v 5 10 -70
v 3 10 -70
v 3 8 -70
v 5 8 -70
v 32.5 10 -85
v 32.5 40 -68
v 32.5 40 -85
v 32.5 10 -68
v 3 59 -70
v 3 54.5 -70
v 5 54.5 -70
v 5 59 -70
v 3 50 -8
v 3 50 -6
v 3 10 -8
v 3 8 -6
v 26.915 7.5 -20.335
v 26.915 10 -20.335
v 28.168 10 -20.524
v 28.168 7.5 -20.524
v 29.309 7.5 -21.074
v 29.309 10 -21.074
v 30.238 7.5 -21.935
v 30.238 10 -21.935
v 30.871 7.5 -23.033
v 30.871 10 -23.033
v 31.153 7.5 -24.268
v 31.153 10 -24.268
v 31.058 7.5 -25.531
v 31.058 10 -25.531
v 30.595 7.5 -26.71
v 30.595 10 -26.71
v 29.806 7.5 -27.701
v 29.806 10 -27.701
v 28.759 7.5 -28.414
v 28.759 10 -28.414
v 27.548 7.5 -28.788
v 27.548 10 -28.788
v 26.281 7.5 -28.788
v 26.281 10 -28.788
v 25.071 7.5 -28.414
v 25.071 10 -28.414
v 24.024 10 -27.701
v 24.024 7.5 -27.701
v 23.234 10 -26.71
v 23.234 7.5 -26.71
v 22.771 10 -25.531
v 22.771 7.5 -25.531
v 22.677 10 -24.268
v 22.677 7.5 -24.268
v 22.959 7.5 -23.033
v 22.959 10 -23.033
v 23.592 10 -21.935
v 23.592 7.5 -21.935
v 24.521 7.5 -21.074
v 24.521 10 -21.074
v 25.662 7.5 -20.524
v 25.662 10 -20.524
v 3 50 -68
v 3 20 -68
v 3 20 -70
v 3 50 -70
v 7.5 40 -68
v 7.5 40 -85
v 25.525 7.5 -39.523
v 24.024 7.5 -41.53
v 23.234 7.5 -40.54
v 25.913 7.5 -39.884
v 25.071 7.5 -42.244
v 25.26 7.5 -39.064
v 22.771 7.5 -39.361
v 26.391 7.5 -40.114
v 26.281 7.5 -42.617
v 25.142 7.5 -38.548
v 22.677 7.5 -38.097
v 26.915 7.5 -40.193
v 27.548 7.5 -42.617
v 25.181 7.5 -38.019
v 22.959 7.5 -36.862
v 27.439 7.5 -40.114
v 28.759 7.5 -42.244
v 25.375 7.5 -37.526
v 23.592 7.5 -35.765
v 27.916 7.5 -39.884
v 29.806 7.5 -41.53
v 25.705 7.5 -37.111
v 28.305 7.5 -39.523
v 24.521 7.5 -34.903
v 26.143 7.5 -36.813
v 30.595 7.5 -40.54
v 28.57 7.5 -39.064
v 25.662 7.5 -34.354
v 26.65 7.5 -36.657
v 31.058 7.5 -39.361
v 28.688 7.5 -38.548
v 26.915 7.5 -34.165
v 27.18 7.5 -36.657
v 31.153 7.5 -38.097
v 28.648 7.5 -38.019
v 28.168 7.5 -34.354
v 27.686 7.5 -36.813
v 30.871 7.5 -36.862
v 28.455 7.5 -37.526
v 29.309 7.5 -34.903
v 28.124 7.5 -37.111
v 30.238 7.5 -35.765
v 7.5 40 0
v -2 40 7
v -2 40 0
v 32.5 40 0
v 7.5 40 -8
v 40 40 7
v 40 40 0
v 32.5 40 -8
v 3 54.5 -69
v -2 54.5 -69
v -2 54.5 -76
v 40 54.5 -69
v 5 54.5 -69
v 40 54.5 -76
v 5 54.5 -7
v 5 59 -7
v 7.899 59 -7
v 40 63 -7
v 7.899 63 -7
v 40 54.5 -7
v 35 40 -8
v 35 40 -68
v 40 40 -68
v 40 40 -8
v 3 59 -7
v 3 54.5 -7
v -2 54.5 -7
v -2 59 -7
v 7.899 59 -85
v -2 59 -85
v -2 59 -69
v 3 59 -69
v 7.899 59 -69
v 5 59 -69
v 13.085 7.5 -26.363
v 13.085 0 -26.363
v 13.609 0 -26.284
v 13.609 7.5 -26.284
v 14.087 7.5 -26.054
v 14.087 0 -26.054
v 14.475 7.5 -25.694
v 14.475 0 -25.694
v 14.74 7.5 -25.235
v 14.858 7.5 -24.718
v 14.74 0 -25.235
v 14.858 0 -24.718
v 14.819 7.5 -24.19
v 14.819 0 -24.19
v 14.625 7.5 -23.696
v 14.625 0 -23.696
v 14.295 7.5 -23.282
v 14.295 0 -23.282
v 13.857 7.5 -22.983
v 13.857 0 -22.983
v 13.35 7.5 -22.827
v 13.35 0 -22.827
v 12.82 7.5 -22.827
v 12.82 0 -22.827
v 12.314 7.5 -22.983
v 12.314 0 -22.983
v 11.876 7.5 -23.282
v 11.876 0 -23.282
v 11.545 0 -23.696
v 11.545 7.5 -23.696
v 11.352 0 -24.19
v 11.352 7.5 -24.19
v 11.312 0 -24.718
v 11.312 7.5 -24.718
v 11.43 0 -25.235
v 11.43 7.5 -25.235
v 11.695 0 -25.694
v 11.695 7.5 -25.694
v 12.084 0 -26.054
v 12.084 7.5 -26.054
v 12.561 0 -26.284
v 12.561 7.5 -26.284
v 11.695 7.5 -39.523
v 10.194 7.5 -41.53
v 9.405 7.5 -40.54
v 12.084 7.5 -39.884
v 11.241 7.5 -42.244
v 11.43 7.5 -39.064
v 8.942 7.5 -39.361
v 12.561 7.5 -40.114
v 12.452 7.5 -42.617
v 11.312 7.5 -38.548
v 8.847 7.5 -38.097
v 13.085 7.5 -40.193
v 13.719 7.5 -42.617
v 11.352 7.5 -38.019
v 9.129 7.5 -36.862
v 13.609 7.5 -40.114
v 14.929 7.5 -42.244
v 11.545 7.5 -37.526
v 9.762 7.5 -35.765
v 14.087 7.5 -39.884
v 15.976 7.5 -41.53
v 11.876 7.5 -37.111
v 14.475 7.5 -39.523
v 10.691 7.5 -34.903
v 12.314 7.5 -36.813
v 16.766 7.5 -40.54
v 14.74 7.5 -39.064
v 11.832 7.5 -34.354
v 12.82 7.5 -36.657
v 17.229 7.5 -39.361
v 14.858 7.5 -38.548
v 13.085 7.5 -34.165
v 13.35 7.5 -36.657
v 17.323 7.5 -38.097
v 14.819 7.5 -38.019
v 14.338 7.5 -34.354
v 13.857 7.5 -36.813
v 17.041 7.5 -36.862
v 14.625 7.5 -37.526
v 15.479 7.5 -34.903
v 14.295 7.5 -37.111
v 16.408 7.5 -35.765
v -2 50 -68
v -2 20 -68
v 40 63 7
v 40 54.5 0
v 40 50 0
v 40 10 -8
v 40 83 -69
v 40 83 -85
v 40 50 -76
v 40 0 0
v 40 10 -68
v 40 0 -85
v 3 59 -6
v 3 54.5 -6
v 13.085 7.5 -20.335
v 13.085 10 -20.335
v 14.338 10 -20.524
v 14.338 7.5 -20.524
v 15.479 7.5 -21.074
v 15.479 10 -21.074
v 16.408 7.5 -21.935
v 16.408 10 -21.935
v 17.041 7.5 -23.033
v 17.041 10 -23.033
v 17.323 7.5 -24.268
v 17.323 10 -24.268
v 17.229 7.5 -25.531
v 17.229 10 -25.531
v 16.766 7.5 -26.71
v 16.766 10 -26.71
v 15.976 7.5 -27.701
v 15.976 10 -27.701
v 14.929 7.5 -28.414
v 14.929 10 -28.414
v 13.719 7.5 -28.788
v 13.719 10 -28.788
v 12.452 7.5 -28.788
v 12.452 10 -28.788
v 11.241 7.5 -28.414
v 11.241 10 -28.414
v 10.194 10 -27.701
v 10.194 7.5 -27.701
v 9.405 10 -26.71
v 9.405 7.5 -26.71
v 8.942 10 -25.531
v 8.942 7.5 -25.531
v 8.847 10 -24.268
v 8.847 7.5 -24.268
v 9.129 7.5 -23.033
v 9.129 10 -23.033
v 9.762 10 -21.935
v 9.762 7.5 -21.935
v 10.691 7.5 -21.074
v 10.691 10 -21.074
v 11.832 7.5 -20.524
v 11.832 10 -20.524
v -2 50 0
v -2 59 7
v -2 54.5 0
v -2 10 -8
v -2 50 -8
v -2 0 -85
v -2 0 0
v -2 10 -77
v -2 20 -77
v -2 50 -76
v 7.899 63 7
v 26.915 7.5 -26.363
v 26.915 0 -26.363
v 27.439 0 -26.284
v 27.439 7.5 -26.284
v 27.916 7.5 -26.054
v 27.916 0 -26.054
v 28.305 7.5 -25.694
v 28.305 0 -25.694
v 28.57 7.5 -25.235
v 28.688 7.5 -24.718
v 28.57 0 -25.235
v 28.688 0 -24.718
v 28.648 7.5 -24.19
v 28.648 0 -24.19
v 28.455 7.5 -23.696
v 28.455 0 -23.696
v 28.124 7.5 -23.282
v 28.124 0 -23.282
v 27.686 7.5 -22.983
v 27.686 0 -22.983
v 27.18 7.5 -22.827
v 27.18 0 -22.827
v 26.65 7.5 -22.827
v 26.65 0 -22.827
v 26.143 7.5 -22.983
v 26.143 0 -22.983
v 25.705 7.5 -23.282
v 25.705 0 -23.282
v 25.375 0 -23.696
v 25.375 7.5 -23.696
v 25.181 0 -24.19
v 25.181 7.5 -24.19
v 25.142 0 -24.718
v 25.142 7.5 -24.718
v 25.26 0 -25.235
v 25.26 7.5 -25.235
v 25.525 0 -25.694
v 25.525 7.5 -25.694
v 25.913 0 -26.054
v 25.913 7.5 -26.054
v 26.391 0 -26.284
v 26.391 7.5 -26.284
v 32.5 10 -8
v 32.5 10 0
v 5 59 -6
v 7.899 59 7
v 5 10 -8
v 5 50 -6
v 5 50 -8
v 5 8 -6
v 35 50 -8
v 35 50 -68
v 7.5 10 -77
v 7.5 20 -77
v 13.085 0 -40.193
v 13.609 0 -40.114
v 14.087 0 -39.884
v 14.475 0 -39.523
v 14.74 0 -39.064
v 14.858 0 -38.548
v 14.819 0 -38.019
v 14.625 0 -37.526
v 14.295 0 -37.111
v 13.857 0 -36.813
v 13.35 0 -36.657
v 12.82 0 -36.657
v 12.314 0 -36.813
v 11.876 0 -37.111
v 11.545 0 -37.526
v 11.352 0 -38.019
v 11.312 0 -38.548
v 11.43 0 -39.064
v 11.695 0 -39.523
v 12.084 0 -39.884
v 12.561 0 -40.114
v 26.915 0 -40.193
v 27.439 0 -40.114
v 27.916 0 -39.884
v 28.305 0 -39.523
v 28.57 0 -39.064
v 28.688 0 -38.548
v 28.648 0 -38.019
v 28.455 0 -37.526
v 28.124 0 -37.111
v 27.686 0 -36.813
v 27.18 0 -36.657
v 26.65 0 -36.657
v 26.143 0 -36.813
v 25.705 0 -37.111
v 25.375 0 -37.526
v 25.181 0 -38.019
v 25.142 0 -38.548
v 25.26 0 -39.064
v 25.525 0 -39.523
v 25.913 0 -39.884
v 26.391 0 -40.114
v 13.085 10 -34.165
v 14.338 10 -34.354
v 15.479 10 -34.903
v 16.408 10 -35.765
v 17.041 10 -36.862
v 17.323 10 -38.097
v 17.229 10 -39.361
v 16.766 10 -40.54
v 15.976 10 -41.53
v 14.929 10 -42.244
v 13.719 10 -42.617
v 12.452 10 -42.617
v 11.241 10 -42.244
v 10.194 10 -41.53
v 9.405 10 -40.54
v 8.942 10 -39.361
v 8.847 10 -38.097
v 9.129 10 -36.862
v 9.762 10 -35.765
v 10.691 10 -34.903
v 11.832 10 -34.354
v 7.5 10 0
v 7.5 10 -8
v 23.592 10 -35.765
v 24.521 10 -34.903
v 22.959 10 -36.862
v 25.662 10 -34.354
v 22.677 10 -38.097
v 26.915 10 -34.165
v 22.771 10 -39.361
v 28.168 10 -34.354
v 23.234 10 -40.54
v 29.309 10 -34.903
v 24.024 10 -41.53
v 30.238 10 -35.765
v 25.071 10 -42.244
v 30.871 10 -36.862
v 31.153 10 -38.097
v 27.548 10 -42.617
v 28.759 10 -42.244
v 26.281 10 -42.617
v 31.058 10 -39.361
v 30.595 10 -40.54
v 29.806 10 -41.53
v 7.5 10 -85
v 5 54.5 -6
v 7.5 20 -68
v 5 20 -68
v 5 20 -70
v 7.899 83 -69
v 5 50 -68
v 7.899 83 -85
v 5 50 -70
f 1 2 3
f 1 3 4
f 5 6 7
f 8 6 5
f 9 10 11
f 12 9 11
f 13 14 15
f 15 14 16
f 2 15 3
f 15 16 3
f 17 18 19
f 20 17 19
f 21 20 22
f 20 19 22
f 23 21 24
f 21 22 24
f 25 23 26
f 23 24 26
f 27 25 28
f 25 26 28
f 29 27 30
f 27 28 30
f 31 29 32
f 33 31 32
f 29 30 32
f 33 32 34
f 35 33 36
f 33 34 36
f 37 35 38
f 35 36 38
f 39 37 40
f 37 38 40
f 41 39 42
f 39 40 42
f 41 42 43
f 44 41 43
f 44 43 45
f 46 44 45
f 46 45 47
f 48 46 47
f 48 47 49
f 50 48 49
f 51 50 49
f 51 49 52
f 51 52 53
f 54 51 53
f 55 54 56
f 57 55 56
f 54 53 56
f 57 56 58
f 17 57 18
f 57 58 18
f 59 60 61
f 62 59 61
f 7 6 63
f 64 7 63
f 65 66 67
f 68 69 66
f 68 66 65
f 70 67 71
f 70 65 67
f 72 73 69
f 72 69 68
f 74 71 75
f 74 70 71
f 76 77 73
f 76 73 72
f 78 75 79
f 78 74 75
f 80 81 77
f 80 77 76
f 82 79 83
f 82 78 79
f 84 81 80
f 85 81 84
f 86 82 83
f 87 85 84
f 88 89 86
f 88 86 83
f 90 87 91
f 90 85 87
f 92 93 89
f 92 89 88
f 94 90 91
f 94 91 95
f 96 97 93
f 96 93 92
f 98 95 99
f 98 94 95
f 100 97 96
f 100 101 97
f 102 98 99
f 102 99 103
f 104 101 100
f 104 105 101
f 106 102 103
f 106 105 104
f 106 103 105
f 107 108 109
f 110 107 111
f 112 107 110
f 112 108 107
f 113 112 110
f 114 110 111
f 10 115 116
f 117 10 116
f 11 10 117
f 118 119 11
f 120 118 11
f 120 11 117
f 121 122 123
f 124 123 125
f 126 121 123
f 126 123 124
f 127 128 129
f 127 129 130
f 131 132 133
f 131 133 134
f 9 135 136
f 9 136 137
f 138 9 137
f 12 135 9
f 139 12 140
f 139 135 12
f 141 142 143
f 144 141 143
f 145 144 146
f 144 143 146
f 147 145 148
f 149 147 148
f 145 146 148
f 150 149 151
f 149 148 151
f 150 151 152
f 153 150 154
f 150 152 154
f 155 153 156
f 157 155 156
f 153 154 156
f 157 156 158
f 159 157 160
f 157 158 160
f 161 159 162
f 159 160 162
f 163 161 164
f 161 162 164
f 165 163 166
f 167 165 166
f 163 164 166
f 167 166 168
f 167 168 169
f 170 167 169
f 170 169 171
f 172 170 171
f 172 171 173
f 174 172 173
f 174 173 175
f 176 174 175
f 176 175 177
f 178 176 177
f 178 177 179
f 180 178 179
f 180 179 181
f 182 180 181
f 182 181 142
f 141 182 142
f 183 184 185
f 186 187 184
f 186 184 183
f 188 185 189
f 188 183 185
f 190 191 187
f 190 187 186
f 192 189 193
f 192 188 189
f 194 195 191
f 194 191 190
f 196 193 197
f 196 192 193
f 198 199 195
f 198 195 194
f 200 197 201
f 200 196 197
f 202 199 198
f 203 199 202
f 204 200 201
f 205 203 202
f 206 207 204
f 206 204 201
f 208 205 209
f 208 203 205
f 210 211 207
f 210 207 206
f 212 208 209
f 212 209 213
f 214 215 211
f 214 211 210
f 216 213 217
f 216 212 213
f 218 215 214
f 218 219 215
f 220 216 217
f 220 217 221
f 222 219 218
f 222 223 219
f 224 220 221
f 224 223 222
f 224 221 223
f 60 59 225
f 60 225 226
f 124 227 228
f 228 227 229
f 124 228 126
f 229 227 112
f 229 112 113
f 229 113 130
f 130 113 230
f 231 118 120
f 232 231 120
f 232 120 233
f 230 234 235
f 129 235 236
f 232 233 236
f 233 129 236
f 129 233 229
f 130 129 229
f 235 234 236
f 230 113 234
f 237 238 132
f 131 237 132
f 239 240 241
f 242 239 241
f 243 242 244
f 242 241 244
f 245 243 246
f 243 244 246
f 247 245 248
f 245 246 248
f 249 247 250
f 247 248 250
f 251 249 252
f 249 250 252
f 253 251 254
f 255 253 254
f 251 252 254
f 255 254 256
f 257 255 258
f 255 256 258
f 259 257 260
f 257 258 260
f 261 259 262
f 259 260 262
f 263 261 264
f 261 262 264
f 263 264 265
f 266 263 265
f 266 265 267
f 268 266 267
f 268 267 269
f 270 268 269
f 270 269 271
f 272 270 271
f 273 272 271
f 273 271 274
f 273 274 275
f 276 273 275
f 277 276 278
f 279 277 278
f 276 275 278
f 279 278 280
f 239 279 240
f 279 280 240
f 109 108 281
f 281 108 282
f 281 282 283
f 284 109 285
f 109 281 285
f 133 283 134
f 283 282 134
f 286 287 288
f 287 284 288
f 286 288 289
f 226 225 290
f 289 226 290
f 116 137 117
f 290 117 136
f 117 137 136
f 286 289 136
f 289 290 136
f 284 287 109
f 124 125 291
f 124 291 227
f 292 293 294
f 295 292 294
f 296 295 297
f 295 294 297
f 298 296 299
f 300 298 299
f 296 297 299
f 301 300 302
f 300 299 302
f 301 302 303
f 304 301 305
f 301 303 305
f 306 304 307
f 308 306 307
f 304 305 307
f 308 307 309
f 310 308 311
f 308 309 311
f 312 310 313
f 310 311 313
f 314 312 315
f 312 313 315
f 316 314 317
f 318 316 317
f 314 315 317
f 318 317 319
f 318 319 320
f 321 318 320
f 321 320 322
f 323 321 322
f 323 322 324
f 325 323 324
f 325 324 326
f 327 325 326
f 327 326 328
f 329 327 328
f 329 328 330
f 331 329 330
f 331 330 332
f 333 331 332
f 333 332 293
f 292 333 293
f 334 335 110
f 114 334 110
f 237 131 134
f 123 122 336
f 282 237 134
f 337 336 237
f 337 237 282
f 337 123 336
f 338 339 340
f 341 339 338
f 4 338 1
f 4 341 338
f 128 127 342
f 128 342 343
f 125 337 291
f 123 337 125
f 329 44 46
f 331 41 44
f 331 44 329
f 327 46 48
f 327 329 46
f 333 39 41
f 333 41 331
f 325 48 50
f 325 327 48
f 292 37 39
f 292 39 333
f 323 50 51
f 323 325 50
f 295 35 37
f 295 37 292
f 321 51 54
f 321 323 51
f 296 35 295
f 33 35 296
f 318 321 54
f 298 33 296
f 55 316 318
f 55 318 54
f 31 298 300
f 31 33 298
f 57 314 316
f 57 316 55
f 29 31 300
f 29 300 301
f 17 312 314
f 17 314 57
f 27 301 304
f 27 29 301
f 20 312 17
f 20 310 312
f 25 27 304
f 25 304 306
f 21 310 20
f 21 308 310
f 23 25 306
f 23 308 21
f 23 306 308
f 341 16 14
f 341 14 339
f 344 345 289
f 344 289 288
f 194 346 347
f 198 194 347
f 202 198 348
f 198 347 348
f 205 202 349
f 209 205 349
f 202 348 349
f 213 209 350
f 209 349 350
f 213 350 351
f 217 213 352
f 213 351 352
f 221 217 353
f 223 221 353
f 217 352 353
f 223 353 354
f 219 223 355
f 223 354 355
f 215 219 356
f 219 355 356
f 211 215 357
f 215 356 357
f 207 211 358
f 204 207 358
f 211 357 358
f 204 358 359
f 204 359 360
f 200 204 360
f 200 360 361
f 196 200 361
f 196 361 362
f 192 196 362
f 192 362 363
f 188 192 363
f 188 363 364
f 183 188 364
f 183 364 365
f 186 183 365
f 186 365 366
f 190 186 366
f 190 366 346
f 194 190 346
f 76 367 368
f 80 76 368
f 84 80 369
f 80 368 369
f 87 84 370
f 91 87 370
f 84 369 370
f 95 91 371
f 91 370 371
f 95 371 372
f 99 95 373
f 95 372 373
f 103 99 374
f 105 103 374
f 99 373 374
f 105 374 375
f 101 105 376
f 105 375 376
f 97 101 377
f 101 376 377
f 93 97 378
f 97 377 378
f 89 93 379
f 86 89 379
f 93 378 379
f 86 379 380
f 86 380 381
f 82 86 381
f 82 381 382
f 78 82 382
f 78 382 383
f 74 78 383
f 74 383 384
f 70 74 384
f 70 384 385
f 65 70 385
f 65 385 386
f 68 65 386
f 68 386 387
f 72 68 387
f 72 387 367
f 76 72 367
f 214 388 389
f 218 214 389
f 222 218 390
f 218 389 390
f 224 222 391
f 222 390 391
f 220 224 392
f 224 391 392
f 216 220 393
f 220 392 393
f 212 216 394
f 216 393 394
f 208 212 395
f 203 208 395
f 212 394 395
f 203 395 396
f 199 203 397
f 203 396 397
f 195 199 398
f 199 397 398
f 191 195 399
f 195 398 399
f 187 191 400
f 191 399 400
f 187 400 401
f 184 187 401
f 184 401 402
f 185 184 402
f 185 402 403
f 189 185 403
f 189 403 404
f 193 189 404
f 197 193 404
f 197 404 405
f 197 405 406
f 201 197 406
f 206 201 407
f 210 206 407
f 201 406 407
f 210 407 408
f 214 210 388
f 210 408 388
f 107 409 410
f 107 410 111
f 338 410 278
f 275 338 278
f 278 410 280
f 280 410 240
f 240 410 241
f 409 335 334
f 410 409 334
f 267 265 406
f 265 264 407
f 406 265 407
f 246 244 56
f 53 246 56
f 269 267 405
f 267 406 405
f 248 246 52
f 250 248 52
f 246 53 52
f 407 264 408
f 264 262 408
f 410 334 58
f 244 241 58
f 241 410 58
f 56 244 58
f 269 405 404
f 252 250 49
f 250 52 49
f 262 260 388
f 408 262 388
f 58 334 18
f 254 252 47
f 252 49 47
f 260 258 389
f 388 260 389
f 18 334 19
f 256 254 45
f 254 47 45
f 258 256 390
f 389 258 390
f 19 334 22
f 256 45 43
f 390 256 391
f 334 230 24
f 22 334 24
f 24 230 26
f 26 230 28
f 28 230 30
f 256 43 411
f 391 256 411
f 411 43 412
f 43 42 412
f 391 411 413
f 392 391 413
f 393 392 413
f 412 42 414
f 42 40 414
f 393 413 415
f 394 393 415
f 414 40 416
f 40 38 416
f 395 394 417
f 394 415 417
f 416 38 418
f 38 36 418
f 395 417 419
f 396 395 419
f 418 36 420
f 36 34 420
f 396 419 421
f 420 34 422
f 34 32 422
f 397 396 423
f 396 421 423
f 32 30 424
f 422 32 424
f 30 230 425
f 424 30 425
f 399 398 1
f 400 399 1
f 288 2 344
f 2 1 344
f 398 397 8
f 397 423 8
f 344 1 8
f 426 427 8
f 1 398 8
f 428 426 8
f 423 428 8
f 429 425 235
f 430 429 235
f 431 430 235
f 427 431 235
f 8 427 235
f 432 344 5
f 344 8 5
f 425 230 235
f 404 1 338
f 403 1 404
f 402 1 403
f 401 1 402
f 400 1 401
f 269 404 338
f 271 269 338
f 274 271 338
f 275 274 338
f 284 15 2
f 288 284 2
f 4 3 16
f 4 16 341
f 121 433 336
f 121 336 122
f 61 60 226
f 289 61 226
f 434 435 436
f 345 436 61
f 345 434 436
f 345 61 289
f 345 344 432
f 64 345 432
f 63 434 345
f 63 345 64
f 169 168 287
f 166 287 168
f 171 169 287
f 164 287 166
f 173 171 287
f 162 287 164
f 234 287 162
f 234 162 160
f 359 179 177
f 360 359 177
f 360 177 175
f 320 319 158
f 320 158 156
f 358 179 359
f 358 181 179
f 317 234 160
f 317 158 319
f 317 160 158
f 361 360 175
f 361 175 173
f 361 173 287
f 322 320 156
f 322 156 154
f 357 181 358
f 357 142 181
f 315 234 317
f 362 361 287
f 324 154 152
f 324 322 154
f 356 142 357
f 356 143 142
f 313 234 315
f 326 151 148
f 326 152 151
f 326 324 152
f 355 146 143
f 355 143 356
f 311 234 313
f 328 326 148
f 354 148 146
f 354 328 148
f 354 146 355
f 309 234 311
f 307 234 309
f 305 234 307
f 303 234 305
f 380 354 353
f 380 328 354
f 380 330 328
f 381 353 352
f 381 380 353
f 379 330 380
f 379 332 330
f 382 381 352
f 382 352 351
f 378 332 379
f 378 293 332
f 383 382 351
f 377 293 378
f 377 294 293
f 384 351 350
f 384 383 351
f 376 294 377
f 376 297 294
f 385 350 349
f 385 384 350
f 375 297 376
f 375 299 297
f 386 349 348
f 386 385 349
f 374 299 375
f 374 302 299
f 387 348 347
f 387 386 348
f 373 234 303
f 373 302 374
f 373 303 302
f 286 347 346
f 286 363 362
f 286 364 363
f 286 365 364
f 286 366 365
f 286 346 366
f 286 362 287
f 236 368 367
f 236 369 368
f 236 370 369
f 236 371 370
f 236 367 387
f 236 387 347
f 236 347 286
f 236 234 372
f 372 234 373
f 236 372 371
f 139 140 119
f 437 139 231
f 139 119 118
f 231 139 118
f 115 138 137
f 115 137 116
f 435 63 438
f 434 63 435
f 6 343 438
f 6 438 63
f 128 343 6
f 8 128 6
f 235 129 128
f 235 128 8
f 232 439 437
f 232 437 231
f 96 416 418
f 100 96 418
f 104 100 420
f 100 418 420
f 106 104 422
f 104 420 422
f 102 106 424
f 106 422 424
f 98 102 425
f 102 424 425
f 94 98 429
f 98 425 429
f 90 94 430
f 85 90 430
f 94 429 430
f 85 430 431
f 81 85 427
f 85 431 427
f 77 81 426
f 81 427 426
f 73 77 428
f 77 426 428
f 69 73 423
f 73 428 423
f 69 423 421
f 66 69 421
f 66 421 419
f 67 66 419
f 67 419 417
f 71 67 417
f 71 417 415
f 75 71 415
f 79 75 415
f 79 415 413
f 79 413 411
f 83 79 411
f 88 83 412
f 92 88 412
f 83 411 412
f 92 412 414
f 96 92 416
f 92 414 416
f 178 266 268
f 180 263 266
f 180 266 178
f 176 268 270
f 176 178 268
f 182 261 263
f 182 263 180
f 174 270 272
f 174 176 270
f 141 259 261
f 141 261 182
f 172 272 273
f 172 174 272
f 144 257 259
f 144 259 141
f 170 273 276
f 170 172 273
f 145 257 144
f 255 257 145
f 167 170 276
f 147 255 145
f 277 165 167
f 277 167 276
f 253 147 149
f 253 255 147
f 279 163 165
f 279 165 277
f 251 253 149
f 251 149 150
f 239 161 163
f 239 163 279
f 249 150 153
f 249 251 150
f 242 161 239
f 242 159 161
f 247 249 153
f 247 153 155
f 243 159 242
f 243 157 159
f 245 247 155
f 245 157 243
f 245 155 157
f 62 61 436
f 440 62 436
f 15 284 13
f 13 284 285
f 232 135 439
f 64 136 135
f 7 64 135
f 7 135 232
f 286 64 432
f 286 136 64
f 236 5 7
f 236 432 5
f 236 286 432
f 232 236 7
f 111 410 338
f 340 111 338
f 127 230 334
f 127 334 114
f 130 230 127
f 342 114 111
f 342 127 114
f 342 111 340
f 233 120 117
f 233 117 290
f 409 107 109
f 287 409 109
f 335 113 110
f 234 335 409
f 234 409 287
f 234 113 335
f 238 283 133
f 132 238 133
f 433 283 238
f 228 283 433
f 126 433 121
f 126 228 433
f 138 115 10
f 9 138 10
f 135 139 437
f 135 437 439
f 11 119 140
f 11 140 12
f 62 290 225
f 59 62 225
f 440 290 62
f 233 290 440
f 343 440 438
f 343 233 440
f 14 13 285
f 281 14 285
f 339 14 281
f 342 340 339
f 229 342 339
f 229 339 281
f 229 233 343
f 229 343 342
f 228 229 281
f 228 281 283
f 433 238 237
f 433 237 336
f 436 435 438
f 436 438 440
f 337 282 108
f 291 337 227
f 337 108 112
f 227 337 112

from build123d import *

# Parameters (mm, degrees)
SKETCH1_W            = 40
SKETCH1_H            = 76
BOSS_EXTRUDE1_DEPTH  = 10
SKETCH2_W            = 40
SKETCH2_H            = 76
SKETCH2_W_2          = 30
SKETCH2_H_2          = 60
BOSS_EXTRUDE2_DEPTH  = 40
SKETCH3_W            = 25
SKETCH3_H            = 30
CUT_EXTRUDE1_DEPTH   = 100.37806599
SKETCH4_W            = 60
SKETCH4_H            = 30
CUT_EXTRUDE2_DEPTH   = 100.37806599
SKETCH9_R            = 1.778
SKETCH9_R_2          = 1.778000002
CUT_EXTRUDE4_DEPTH   = 40
BOSS_EXTRUDE4_START  = -10
SKETCH12_R           = 1.778
BOSS_EXTRUDE4_DEPTH  = 10
SKETCH13_W           = 40
SKETCH13_H           = 10
BOSS_EXTRUDE5_DEPTH  = 7
SKETCH14_W           = 40
SKETCH14_H           = 10
BOSS_EXTRUDE6_DEPTH  = 7
SKETCH16_W           = 40
SKETCH16_H           = 7
BOSS_EXTRUDE7_DEPTH  = 4.5
SKETCH17_W           = 40
SKETCH17_H           = 4.5
BOSS_EXTRUDE8_DEPTH  = 14
SKETCH18_W           = 40
SKETCH18_H           = 4.5
BOSS_EXTRUDE9_DEPTH  = 14
SKETCH19_W           = 40
SKETCH19_H           = 19
BOSS_EXTRUDE10_DEPTH = 2
BOSS_EXTRUDE11_DEPTH = 9
CUT_EXTRUDE6_START   = -7.5
SKETCH21_W           = 9
SKETCH21_H           = 10
CUT_EXTRUDE6_DEPTH   = 7.5
BOSS_EXTRUDE13_DEPTH = 2
CUT_EXTRUDE7_START   = -49
SKETCH25_W           = 2
SKETCH25_H           = 64
CUT_EXTRUDE7_DEPTH   = 49
SKETCH26_W           = 2
SKETCH26_H           = 64
CUT_EXTRUDE8_DEPTH   = 42
SKETCH27_W           = 60
SKETCH27_H           = 10
CUT_EXTRUDE10_DEPTH  = 10
SKETCH28_W           = 32.101148564
SKETCH28_H           = 16
BOSS_EXTRUDE14_DEPTH = 24
SKETCH29_W           = 32.101148564
SKETCH29_H           = 14
BOSS_EXTRUDE15_DEPTH = 4
SKETCH30_R           = 4.25
CUT_EXTRUDE11_DEPTH  = 2.5


with BuildPart() as part:
    # Sketch1 → Boss-Extrude1 (new body)
    with BuildSketch(Plane(origin=(0, 0, 0), x_dir=(1, 0, 0), z_dir=(0, 1, 0))):
        with Locations((20, 38)):
            Rectangle(SKETCH1_W, SKETCH1_H)
    extrude(amount=BOSS_EXTRUDE1_DEPTH)

    # Sketch2 → Boss-Extrude2 (add)
    with BuildSketch(Plane(origin=(0, 10, 0), x_dir=(1, 0, 0), z_dir=(0, 1, 0))):
        with Locations((20, 38)):
            Rectangle(SKETCH2_W, SKETCH2_H)
        with Locations((20, 38)):
            Rectangle(SKETCH2_W_2, SKETCH2_H_2, mode=Mode.SUBTRACT)
    extrude(amount=BOSS_EXTRUDE2_DEPTH)

    # Sketch3 → Cut-Extrude1 (cut, through all)
    with BuildSketch(Plane.XY):
        with Locations((20, 25)):
            Rectangle(SKETCH3_W, SKETCH3_H)
    extrude(amount=-CUT_EXTRUDE1_DEPTH, mode=Mode.SUBTRACT)

    # Sketch4 → Cut-Extrude2 (cut, through all)
    with BuildSketch(Plane.ZY):
        with Locations((-38, 25)):
            Rectangle(SKETCH4_W, SKETCH4_H)
    extrude(amount=-CUT_EXTRUDE2_DEPTH, mode=Mode.SUBTRACT)

    # Sketch9 → Cut-Extrude4 (cut)
    with BuildSketch(Plane.XZ):
        with Locations(Location((26.914797213, -38.414797213, 0), (0, 0, 270))):
            Circle(SKETCH9_R)
        with Locations(Location((13.085202787, -24.585202787, 0), (0, 0, 270))):
            Circle(SKETCH9_R)
        with Locations(Location((26.914797213, -24.585202787, 0), (0, 0, 270))):
            Circle(SKETCH9_R)
        with Locations(Location((29.778999999, -31.5, 0), (0, 0, 270))):
            Circle(SKETCH9_R)
        with Locations(Location((13.085202787, -38.414797213, 0), (0, 0, 270))):
            Circle(SKETCH9_R_2)
    extrude(amount=-CUT_EXTRUDE4_DEPTH, mode=Mode.SUBTRACT)

    # Sketch12 → Boss-Extrude4 (add)
    with BuildSketch(Plane(origin=(0, 10, 0), x_dir=(1, 0, 0), z_dir=(0, 1, 0)).offset(BOSS_EXTRUDE4_START)):
        with Locations((29.778999999, 31.5)):
            Circle(SKETCH12_R)
    extrude(amount=BOSS_EXTRUDE4_DEPTH)

    # Sketch13 → Boss-Extrude5 (add)
    with BuildSketch(Plane.XY):
        with Locations((20, 45)):
            Rectangle(SKETCH13_W, SKETCH13_H)
    extrude(amount=BOSS_EXTRUDE5_DEPTH)

    # Sketch14 → Boss-Extrude6 (add)
    with BuildSketch(Plane(origin=(0, 0, -76), x_dir=(-1, 0, 0), z_dir=(0, 0, -1))):
        with Locations((-20, 45)):
            Rectangle(SKETCH14_W, SKETCH14_H)
    extrude(amount=BOSS_EXTRUDE6_DEPTH)

    # Sketch16 → Boss-Extrude7 (add)
    with BuildSketch(Plane(origin=(0, 50, 0), x_dir=(1, 0, 0), z_dir=(0, 1, 0))):
        with Locations((20, 79.5)):
            Rectangle(SKETCH16_W, SKETCH16_H)
        with Locations((20, -3.5)):
            Rectangle(SKETCH16_W, SKETCH16_H)
    extrude(amount=BOSS_EXTRUDE7_DEPTH)

    # Sketch17 → Boss-Extrude8 (add)
    with BuildSketch(Plane(origin=(0, 0, -83), x_dir=(-1, 0, 0), z_dir=(0, 0, -1))):
        with Locations((-20, 56.75)):
            Rectangle(SKETCH17_W, SKETCH17_H)
    extrude(amount=-BOSS_EXTRUDE8_DEPTH)

    # Sketch18 → Boss-Extrude9 (add)
    with BuildSketch(Plane.XY.offset(7)):
        with Locations((20, 56.75)):
            Rectangle(SKETCH18_W, SKETCH18_H)
    extrude(amount=-BOSS_EXTRUDE9_DEPTH)

    # Sketch19 → Boss-Extrude10 (add)
    with BuildSketch(Plane(origin=(0, 0, -83), x_dir=(-1, 0, 0), z_dir=(0, 0, -1))):
        with Locations((-20, 49.5)):
            Rectangle(SKETCH19_W, SKETCH19_H)
    extrude(amount=BOSS_EXTRUDE10_DEPTH)

    # Sketch20 → Boss-Extrude11 (add)
    with BuildSketch(Plane(origin=(0, 0, -76), x_dir=(-1, 0, 0), z_dir=(0, 0, -1))):
        Polygon((0, 40), (0, 0), (-40, 0), (-40, 40), (-32.5, 40), (-32.5, 10), (-7.5, 10), (-7.5, 40), align=None)
    extrude(amount=BOSS_EXTRUDE11_DEPTH)

    # Sketch21 → Cut-Extrude6 (cut)
    with BuildSketch(Plane.ZY.offset(CUT_EXTRUDE6_START)):
        with Locations((-72.5, 15)):
            Rectangle(SKETCH21_W, SKETCH21_H)
    extrude(amount=CUT_EXTRUDE6_DEPTH, mode=Mode.SUBTRACT)

    # Sketch23 → Boss-Extrude13 (add)
    with BuildSketch(Plane.ZY):
        Polygon((-69, 59), (-69, 54.5), (-76, 54.5), (-76, 50), (0, 50), (0, 54.5), (-7, 54.5), (-7, 59), (7, 59), (7, 40), (0, 40), (0, 0), (-85, 0), (-85, 59), align=None)
        Polygon((-68, 40), (-68, 20), (-77, 20), (-77, 10), (-76.5, 10), (-8, 10), (-8, 40), align=None, mode=Mode.SUBTRACT)
    extrude(amount=BOSS_EXTRUDE13_DEPTH)

    # Sketch25 → Cut-Extrude7 (cut)
    with BuildSketch(Plane(origin=(0, 59, 0), x_dir=(1, 0, 0), z_dir=(0, 1, 0)).offset(CUT_EXTRUDE7_START)):
        with Locations((4, 38)):
            Rectangle(SKETCH25_W, SKETCH25_H)
    extrude(amount=CUT_EXTRUDE7_DEPTH, mode=Mode.SUBTRACT)

    # Sketch26 → Cut-Extrude8 (cut)
    with BuildSketch(Plane(origin=(0, 50, 0), x_dir=(1, 0, 0), z_dir=(0, 1, 0))):
        with Locations((4, 38)):
            Rectangle(SKETCH26_W, SKETCH26_H)
    extrude(amount=-CUT_EXTRUDE8_DEPTH, mode=Mode.SUBTRACT)

    # Sketch27 → Cut-Extrude10 (cut)
    with BuildSketch(Plane.ZY.offset(2)):
        with Locations((-38, 45)):
            Rectangle(SKETCH27_W, SKETCH27_H)
    extrude(amount=-CUT_EXTRUDE10_DEPTH, mode=Mode.SUBTRACT)

    # Sketch28 → Boss-Extrude14 (add)
    with BuildSketch(Plane(origin=(0, 59, 0), x_dir=(1, 0, 0), z_dir=(0, 1, 0))):
        with Locations((23.949425718, 77)):
            Rectangle(SKETCH28_W, SKETCH28_H)
    extrude(amount=BOSS_EXTRUDE14_DEPTH)

    # Sketch29 → Boss-Extrude15 (add)
    with BuildSketch(Plane(origin=(0, 59, 0), x_dir=(1, 0, 0), z_dir=(0, 1, 0))):
        with Locations((23.949425718, 0)):
            Rectangle(SKETCH29_W, SKETCH29_H)
    extrude(amount=BOSS_EXTRUDE15_DEPTH)

    # Sketch30 → Cut-Extrude11 (cut)
    with BuildSketch(Plane(origin=(0, 10, 0), x_dir=(1, 0, 0), z_dir=(0, 1, 0))):
        with Locations(Location((13.085202787, 24.585202787, 0), (0, 0, 270))):
            Circle(SKETCH30_R)
        with Locations(Location((13.085202787, 38.414797213, 0), (0, 0, 270))):
            Circle(SKETCH30_R)
        with Locations(Location((26.914797213, 38.414797213, 0), (0, 0, 270))):
            Circle(SKETCH30_R)
        with Locations(Location((26.914797213, 24.585202787, 0), (0, 0, 270))):
            Circle(SKETCH30_R)
    extrude(amount=-CUT_EXTRUDE11_DEPTH, mode=Mode.SUBTRACT)


solid = part.part
